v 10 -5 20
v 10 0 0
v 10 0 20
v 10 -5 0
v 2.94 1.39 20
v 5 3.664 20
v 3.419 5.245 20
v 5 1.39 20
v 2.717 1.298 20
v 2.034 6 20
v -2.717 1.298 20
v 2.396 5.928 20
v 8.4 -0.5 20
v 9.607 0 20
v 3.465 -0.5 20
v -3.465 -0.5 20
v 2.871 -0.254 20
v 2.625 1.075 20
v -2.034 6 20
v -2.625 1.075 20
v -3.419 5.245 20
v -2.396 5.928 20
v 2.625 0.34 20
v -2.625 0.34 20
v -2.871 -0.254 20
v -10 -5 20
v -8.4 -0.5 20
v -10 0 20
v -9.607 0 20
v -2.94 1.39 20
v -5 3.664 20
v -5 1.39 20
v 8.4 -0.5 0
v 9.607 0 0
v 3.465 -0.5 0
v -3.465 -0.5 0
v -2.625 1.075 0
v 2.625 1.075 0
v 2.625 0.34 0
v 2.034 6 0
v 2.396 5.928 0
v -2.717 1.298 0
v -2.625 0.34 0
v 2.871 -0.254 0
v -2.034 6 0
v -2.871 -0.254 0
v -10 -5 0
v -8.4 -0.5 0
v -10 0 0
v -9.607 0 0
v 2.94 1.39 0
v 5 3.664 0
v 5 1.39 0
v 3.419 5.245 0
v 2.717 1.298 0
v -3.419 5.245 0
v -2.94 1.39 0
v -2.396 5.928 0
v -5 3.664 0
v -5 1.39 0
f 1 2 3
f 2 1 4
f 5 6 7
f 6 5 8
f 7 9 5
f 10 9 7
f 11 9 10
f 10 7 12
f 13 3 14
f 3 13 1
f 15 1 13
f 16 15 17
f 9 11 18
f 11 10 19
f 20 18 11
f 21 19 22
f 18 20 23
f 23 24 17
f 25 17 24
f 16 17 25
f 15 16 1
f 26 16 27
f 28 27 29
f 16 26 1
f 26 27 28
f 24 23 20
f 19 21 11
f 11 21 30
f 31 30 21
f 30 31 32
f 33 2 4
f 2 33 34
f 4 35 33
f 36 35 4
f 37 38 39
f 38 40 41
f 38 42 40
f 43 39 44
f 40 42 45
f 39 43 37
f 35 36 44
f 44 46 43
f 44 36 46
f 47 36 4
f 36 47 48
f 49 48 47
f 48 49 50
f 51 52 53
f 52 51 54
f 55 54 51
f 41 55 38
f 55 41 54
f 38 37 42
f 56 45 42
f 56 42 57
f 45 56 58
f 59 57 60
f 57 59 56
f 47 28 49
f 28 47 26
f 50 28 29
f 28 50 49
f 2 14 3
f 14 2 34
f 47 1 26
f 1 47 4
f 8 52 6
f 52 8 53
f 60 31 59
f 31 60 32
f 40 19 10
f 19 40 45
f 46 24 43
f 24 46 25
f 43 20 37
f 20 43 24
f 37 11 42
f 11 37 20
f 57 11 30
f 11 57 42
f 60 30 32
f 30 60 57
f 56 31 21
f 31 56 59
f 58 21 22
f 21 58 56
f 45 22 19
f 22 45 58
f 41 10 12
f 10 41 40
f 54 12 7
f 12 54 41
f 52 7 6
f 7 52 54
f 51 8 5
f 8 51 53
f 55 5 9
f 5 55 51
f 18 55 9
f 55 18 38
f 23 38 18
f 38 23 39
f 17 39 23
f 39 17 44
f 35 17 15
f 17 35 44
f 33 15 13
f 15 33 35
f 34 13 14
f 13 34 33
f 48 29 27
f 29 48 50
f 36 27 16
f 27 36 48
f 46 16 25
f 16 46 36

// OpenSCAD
//Bukoff
module profile(h=50) {
	scale(1.05)linear_extrude(height=h)import("profile.dxf");
}

//Option: FDM Printed Glider
module glider(x=20,y=5,z=20,ex=8.5,b=5) {
	translate([0,0,z/2])cube([x,y,z],center=true);
	translate([0,ex/2,z/2])cube([b,ex,z],center=true);
}

module glider_cut(b) {
	intersection() {
		translate([0,10])profile();
		translate([0,-2.5])glider(b=b);
	}
}
module glider1(b) {
	difference() {
		translate([0,-2.5])glider(b=b);
		glider_cut(b=b);
	}
}

//Option: Laser Cut Glider
module flat() {
	difference(){
		square([20,50],center=true);
		for(i=[-1,1])translate([0,i*22.5])square(5,center=true);
	}
}
module stick_out() {
		square([8,50],center=true);
		for(i=[-1,1])translate([-6.5,i*22.5])square(5,center=true);
}
module cut_glider() {
	flat();
	translate([19.01,0])stick_out();
}

//Render

!glider1(b=10);
glider1(b=7);
glider1(b=5);
cut_glider();
